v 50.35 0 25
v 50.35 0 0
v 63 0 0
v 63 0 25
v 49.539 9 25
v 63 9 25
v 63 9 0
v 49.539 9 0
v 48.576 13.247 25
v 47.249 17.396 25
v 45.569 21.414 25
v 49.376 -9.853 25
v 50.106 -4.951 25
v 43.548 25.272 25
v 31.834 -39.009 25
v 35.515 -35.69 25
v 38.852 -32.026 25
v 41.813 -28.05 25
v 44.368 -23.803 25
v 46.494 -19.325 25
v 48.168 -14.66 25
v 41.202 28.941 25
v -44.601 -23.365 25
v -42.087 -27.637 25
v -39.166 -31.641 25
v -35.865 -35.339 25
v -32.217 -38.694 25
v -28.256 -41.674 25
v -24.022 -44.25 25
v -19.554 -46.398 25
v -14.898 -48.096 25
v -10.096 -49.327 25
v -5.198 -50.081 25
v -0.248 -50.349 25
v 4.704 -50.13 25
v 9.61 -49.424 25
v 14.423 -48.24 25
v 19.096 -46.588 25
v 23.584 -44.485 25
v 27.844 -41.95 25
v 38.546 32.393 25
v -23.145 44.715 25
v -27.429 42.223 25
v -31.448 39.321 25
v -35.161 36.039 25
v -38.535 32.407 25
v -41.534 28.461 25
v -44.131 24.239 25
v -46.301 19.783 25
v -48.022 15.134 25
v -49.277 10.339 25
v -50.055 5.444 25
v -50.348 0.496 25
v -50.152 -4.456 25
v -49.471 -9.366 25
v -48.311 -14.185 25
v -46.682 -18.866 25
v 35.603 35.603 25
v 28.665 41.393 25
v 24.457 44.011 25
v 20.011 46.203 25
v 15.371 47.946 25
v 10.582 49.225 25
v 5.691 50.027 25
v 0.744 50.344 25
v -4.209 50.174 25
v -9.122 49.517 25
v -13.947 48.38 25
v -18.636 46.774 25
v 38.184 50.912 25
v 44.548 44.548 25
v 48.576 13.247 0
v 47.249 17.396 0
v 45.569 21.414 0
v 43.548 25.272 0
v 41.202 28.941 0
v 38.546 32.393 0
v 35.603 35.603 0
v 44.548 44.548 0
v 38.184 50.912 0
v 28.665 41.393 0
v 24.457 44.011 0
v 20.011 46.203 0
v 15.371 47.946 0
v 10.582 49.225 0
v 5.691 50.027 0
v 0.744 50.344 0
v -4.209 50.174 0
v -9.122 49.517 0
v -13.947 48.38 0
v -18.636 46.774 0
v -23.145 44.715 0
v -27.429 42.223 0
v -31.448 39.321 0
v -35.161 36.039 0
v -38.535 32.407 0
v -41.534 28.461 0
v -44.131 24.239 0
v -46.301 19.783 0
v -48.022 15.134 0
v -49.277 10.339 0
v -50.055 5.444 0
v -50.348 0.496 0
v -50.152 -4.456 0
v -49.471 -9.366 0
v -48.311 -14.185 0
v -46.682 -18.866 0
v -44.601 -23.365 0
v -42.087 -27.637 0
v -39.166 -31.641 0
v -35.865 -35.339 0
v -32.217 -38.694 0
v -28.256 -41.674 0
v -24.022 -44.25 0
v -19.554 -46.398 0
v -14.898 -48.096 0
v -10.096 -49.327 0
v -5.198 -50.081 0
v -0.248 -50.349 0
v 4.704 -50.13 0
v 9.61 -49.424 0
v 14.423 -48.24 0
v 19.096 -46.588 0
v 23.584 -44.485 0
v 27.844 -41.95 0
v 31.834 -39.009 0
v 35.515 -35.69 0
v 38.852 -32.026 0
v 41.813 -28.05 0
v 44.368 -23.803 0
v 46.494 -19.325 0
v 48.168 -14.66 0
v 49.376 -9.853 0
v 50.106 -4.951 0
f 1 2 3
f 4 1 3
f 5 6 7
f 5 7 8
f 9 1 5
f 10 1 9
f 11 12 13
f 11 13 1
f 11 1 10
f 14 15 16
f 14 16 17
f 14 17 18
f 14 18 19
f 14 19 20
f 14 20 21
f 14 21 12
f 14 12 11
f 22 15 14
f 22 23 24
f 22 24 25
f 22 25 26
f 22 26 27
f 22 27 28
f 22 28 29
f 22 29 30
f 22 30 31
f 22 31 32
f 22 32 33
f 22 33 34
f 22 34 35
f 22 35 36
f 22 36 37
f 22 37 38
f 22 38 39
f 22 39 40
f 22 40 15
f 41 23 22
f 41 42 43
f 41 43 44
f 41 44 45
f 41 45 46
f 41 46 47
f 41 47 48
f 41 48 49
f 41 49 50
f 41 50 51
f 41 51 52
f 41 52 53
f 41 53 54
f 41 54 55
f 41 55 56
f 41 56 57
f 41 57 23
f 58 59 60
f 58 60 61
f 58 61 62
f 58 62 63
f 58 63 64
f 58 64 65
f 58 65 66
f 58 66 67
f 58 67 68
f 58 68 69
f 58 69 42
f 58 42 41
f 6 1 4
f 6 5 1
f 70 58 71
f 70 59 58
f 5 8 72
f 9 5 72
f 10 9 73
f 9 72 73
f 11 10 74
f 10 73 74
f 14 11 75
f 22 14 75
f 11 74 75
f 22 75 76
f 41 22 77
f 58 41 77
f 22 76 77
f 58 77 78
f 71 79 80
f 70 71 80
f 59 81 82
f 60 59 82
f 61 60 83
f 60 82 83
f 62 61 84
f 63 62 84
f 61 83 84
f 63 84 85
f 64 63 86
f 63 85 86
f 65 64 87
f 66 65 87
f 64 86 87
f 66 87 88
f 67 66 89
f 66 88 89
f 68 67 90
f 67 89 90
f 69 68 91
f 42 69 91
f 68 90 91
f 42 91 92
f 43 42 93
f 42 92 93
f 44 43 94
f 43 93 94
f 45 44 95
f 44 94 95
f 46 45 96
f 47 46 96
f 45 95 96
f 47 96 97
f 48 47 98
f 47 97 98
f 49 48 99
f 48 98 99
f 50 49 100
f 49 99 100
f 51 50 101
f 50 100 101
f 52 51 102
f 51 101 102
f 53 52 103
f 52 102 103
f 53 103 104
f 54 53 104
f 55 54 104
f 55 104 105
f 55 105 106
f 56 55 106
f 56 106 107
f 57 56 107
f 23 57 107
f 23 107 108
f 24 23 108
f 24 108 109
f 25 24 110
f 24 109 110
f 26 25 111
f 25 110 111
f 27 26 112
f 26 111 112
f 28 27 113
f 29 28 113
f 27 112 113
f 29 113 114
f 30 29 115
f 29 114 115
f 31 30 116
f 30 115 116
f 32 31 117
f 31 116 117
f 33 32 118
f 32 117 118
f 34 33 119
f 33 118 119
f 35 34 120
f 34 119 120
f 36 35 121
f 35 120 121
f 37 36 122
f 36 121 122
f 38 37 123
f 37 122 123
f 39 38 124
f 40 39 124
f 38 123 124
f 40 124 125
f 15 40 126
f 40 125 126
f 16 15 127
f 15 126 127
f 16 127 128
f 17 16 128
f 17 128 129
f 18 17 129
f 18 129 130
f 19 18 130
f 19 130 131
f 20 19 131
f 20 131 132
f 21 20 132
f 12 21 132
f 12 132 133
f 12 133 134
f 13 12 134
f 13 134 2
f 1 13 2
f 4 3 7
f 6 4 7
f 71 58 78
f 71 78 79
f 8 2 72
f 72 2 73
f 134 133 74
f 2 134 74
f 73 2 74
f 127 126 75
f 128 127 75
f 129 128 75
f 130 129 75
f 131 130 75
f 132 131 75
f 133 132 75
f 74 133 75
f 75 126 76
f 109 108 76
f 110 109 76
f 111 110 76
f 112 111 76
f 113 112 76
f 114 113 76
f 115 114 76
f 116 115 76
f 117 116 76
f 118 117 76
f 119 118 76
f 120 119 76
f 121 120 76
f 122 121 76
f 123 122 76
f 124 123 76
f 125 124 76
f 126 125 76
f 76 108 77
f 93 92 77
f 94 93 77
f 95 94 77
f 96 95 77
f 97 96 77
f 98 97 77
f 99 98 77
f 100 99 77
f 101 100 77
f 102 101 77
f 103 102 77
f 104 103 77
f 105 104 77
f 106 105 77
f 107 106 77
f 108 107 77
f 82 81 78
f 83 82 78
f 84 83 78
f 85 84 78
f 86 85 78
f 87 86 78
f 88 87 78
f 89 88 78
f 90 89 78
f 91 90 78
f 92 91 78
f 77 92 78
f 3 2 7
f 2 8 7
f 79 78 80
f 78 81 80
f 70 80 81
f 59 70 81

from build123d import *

# Parameters (mm, degrees)
F1_DEPTH = 25


with BuildPart() as f1:
    # F0 (on Top) → F1 (new body)
    with BuildSketch(Plane.XY):
        with BuildLine():
            Line((0, 0), (50.35, 0))
            ThreePointArc((50.35, 0), (50.146865, 4.518229), (49.539101, 9))
            ThreePointArc((49.539101, 9), (44.600611, 23.364673), (35.602826, 35.602826))
            Line((35.602826, 35.602826), (0, 0))
        make_face()
        with BuildLine():
            ThreePointArc((28.665473, 41.393395), (-44.600611, -23.364673), (50.35, 0))
            Line((50.35, 0), (0, 0))
            Line((0, 0), (35.602826, 35.602826))
            ThreePointArc((35.602826, 35.602826), (32.264319, 38.654059), (28.665473, 41.393395))
        make_face()
        with BuildLine():
            ThreePointArc((49.539101, 9), (50.146865, 4.518229), (50.35, 0))
            Line((50.35, 0), (63, 0))
            Line((63, 0), (63, 9))
            Line((63, 9), (49.539101, 9))
        make_face()
        with BuildLine():
            Line((38.183766, 50.911688), (28.665473, 41.393395))
            ThreePointArc((28.665473, 41.393395), (32.264319, 38.654059), (35.602826, 35.602826))
            Line((35.602826, 35.602826), (44.547727, 44.547727))
            Line((44.547727, 44.547727), (38.183766, 50.911688))
        make_face()
    extrude(amount=F1_DEPTH)


solid = f1.part
